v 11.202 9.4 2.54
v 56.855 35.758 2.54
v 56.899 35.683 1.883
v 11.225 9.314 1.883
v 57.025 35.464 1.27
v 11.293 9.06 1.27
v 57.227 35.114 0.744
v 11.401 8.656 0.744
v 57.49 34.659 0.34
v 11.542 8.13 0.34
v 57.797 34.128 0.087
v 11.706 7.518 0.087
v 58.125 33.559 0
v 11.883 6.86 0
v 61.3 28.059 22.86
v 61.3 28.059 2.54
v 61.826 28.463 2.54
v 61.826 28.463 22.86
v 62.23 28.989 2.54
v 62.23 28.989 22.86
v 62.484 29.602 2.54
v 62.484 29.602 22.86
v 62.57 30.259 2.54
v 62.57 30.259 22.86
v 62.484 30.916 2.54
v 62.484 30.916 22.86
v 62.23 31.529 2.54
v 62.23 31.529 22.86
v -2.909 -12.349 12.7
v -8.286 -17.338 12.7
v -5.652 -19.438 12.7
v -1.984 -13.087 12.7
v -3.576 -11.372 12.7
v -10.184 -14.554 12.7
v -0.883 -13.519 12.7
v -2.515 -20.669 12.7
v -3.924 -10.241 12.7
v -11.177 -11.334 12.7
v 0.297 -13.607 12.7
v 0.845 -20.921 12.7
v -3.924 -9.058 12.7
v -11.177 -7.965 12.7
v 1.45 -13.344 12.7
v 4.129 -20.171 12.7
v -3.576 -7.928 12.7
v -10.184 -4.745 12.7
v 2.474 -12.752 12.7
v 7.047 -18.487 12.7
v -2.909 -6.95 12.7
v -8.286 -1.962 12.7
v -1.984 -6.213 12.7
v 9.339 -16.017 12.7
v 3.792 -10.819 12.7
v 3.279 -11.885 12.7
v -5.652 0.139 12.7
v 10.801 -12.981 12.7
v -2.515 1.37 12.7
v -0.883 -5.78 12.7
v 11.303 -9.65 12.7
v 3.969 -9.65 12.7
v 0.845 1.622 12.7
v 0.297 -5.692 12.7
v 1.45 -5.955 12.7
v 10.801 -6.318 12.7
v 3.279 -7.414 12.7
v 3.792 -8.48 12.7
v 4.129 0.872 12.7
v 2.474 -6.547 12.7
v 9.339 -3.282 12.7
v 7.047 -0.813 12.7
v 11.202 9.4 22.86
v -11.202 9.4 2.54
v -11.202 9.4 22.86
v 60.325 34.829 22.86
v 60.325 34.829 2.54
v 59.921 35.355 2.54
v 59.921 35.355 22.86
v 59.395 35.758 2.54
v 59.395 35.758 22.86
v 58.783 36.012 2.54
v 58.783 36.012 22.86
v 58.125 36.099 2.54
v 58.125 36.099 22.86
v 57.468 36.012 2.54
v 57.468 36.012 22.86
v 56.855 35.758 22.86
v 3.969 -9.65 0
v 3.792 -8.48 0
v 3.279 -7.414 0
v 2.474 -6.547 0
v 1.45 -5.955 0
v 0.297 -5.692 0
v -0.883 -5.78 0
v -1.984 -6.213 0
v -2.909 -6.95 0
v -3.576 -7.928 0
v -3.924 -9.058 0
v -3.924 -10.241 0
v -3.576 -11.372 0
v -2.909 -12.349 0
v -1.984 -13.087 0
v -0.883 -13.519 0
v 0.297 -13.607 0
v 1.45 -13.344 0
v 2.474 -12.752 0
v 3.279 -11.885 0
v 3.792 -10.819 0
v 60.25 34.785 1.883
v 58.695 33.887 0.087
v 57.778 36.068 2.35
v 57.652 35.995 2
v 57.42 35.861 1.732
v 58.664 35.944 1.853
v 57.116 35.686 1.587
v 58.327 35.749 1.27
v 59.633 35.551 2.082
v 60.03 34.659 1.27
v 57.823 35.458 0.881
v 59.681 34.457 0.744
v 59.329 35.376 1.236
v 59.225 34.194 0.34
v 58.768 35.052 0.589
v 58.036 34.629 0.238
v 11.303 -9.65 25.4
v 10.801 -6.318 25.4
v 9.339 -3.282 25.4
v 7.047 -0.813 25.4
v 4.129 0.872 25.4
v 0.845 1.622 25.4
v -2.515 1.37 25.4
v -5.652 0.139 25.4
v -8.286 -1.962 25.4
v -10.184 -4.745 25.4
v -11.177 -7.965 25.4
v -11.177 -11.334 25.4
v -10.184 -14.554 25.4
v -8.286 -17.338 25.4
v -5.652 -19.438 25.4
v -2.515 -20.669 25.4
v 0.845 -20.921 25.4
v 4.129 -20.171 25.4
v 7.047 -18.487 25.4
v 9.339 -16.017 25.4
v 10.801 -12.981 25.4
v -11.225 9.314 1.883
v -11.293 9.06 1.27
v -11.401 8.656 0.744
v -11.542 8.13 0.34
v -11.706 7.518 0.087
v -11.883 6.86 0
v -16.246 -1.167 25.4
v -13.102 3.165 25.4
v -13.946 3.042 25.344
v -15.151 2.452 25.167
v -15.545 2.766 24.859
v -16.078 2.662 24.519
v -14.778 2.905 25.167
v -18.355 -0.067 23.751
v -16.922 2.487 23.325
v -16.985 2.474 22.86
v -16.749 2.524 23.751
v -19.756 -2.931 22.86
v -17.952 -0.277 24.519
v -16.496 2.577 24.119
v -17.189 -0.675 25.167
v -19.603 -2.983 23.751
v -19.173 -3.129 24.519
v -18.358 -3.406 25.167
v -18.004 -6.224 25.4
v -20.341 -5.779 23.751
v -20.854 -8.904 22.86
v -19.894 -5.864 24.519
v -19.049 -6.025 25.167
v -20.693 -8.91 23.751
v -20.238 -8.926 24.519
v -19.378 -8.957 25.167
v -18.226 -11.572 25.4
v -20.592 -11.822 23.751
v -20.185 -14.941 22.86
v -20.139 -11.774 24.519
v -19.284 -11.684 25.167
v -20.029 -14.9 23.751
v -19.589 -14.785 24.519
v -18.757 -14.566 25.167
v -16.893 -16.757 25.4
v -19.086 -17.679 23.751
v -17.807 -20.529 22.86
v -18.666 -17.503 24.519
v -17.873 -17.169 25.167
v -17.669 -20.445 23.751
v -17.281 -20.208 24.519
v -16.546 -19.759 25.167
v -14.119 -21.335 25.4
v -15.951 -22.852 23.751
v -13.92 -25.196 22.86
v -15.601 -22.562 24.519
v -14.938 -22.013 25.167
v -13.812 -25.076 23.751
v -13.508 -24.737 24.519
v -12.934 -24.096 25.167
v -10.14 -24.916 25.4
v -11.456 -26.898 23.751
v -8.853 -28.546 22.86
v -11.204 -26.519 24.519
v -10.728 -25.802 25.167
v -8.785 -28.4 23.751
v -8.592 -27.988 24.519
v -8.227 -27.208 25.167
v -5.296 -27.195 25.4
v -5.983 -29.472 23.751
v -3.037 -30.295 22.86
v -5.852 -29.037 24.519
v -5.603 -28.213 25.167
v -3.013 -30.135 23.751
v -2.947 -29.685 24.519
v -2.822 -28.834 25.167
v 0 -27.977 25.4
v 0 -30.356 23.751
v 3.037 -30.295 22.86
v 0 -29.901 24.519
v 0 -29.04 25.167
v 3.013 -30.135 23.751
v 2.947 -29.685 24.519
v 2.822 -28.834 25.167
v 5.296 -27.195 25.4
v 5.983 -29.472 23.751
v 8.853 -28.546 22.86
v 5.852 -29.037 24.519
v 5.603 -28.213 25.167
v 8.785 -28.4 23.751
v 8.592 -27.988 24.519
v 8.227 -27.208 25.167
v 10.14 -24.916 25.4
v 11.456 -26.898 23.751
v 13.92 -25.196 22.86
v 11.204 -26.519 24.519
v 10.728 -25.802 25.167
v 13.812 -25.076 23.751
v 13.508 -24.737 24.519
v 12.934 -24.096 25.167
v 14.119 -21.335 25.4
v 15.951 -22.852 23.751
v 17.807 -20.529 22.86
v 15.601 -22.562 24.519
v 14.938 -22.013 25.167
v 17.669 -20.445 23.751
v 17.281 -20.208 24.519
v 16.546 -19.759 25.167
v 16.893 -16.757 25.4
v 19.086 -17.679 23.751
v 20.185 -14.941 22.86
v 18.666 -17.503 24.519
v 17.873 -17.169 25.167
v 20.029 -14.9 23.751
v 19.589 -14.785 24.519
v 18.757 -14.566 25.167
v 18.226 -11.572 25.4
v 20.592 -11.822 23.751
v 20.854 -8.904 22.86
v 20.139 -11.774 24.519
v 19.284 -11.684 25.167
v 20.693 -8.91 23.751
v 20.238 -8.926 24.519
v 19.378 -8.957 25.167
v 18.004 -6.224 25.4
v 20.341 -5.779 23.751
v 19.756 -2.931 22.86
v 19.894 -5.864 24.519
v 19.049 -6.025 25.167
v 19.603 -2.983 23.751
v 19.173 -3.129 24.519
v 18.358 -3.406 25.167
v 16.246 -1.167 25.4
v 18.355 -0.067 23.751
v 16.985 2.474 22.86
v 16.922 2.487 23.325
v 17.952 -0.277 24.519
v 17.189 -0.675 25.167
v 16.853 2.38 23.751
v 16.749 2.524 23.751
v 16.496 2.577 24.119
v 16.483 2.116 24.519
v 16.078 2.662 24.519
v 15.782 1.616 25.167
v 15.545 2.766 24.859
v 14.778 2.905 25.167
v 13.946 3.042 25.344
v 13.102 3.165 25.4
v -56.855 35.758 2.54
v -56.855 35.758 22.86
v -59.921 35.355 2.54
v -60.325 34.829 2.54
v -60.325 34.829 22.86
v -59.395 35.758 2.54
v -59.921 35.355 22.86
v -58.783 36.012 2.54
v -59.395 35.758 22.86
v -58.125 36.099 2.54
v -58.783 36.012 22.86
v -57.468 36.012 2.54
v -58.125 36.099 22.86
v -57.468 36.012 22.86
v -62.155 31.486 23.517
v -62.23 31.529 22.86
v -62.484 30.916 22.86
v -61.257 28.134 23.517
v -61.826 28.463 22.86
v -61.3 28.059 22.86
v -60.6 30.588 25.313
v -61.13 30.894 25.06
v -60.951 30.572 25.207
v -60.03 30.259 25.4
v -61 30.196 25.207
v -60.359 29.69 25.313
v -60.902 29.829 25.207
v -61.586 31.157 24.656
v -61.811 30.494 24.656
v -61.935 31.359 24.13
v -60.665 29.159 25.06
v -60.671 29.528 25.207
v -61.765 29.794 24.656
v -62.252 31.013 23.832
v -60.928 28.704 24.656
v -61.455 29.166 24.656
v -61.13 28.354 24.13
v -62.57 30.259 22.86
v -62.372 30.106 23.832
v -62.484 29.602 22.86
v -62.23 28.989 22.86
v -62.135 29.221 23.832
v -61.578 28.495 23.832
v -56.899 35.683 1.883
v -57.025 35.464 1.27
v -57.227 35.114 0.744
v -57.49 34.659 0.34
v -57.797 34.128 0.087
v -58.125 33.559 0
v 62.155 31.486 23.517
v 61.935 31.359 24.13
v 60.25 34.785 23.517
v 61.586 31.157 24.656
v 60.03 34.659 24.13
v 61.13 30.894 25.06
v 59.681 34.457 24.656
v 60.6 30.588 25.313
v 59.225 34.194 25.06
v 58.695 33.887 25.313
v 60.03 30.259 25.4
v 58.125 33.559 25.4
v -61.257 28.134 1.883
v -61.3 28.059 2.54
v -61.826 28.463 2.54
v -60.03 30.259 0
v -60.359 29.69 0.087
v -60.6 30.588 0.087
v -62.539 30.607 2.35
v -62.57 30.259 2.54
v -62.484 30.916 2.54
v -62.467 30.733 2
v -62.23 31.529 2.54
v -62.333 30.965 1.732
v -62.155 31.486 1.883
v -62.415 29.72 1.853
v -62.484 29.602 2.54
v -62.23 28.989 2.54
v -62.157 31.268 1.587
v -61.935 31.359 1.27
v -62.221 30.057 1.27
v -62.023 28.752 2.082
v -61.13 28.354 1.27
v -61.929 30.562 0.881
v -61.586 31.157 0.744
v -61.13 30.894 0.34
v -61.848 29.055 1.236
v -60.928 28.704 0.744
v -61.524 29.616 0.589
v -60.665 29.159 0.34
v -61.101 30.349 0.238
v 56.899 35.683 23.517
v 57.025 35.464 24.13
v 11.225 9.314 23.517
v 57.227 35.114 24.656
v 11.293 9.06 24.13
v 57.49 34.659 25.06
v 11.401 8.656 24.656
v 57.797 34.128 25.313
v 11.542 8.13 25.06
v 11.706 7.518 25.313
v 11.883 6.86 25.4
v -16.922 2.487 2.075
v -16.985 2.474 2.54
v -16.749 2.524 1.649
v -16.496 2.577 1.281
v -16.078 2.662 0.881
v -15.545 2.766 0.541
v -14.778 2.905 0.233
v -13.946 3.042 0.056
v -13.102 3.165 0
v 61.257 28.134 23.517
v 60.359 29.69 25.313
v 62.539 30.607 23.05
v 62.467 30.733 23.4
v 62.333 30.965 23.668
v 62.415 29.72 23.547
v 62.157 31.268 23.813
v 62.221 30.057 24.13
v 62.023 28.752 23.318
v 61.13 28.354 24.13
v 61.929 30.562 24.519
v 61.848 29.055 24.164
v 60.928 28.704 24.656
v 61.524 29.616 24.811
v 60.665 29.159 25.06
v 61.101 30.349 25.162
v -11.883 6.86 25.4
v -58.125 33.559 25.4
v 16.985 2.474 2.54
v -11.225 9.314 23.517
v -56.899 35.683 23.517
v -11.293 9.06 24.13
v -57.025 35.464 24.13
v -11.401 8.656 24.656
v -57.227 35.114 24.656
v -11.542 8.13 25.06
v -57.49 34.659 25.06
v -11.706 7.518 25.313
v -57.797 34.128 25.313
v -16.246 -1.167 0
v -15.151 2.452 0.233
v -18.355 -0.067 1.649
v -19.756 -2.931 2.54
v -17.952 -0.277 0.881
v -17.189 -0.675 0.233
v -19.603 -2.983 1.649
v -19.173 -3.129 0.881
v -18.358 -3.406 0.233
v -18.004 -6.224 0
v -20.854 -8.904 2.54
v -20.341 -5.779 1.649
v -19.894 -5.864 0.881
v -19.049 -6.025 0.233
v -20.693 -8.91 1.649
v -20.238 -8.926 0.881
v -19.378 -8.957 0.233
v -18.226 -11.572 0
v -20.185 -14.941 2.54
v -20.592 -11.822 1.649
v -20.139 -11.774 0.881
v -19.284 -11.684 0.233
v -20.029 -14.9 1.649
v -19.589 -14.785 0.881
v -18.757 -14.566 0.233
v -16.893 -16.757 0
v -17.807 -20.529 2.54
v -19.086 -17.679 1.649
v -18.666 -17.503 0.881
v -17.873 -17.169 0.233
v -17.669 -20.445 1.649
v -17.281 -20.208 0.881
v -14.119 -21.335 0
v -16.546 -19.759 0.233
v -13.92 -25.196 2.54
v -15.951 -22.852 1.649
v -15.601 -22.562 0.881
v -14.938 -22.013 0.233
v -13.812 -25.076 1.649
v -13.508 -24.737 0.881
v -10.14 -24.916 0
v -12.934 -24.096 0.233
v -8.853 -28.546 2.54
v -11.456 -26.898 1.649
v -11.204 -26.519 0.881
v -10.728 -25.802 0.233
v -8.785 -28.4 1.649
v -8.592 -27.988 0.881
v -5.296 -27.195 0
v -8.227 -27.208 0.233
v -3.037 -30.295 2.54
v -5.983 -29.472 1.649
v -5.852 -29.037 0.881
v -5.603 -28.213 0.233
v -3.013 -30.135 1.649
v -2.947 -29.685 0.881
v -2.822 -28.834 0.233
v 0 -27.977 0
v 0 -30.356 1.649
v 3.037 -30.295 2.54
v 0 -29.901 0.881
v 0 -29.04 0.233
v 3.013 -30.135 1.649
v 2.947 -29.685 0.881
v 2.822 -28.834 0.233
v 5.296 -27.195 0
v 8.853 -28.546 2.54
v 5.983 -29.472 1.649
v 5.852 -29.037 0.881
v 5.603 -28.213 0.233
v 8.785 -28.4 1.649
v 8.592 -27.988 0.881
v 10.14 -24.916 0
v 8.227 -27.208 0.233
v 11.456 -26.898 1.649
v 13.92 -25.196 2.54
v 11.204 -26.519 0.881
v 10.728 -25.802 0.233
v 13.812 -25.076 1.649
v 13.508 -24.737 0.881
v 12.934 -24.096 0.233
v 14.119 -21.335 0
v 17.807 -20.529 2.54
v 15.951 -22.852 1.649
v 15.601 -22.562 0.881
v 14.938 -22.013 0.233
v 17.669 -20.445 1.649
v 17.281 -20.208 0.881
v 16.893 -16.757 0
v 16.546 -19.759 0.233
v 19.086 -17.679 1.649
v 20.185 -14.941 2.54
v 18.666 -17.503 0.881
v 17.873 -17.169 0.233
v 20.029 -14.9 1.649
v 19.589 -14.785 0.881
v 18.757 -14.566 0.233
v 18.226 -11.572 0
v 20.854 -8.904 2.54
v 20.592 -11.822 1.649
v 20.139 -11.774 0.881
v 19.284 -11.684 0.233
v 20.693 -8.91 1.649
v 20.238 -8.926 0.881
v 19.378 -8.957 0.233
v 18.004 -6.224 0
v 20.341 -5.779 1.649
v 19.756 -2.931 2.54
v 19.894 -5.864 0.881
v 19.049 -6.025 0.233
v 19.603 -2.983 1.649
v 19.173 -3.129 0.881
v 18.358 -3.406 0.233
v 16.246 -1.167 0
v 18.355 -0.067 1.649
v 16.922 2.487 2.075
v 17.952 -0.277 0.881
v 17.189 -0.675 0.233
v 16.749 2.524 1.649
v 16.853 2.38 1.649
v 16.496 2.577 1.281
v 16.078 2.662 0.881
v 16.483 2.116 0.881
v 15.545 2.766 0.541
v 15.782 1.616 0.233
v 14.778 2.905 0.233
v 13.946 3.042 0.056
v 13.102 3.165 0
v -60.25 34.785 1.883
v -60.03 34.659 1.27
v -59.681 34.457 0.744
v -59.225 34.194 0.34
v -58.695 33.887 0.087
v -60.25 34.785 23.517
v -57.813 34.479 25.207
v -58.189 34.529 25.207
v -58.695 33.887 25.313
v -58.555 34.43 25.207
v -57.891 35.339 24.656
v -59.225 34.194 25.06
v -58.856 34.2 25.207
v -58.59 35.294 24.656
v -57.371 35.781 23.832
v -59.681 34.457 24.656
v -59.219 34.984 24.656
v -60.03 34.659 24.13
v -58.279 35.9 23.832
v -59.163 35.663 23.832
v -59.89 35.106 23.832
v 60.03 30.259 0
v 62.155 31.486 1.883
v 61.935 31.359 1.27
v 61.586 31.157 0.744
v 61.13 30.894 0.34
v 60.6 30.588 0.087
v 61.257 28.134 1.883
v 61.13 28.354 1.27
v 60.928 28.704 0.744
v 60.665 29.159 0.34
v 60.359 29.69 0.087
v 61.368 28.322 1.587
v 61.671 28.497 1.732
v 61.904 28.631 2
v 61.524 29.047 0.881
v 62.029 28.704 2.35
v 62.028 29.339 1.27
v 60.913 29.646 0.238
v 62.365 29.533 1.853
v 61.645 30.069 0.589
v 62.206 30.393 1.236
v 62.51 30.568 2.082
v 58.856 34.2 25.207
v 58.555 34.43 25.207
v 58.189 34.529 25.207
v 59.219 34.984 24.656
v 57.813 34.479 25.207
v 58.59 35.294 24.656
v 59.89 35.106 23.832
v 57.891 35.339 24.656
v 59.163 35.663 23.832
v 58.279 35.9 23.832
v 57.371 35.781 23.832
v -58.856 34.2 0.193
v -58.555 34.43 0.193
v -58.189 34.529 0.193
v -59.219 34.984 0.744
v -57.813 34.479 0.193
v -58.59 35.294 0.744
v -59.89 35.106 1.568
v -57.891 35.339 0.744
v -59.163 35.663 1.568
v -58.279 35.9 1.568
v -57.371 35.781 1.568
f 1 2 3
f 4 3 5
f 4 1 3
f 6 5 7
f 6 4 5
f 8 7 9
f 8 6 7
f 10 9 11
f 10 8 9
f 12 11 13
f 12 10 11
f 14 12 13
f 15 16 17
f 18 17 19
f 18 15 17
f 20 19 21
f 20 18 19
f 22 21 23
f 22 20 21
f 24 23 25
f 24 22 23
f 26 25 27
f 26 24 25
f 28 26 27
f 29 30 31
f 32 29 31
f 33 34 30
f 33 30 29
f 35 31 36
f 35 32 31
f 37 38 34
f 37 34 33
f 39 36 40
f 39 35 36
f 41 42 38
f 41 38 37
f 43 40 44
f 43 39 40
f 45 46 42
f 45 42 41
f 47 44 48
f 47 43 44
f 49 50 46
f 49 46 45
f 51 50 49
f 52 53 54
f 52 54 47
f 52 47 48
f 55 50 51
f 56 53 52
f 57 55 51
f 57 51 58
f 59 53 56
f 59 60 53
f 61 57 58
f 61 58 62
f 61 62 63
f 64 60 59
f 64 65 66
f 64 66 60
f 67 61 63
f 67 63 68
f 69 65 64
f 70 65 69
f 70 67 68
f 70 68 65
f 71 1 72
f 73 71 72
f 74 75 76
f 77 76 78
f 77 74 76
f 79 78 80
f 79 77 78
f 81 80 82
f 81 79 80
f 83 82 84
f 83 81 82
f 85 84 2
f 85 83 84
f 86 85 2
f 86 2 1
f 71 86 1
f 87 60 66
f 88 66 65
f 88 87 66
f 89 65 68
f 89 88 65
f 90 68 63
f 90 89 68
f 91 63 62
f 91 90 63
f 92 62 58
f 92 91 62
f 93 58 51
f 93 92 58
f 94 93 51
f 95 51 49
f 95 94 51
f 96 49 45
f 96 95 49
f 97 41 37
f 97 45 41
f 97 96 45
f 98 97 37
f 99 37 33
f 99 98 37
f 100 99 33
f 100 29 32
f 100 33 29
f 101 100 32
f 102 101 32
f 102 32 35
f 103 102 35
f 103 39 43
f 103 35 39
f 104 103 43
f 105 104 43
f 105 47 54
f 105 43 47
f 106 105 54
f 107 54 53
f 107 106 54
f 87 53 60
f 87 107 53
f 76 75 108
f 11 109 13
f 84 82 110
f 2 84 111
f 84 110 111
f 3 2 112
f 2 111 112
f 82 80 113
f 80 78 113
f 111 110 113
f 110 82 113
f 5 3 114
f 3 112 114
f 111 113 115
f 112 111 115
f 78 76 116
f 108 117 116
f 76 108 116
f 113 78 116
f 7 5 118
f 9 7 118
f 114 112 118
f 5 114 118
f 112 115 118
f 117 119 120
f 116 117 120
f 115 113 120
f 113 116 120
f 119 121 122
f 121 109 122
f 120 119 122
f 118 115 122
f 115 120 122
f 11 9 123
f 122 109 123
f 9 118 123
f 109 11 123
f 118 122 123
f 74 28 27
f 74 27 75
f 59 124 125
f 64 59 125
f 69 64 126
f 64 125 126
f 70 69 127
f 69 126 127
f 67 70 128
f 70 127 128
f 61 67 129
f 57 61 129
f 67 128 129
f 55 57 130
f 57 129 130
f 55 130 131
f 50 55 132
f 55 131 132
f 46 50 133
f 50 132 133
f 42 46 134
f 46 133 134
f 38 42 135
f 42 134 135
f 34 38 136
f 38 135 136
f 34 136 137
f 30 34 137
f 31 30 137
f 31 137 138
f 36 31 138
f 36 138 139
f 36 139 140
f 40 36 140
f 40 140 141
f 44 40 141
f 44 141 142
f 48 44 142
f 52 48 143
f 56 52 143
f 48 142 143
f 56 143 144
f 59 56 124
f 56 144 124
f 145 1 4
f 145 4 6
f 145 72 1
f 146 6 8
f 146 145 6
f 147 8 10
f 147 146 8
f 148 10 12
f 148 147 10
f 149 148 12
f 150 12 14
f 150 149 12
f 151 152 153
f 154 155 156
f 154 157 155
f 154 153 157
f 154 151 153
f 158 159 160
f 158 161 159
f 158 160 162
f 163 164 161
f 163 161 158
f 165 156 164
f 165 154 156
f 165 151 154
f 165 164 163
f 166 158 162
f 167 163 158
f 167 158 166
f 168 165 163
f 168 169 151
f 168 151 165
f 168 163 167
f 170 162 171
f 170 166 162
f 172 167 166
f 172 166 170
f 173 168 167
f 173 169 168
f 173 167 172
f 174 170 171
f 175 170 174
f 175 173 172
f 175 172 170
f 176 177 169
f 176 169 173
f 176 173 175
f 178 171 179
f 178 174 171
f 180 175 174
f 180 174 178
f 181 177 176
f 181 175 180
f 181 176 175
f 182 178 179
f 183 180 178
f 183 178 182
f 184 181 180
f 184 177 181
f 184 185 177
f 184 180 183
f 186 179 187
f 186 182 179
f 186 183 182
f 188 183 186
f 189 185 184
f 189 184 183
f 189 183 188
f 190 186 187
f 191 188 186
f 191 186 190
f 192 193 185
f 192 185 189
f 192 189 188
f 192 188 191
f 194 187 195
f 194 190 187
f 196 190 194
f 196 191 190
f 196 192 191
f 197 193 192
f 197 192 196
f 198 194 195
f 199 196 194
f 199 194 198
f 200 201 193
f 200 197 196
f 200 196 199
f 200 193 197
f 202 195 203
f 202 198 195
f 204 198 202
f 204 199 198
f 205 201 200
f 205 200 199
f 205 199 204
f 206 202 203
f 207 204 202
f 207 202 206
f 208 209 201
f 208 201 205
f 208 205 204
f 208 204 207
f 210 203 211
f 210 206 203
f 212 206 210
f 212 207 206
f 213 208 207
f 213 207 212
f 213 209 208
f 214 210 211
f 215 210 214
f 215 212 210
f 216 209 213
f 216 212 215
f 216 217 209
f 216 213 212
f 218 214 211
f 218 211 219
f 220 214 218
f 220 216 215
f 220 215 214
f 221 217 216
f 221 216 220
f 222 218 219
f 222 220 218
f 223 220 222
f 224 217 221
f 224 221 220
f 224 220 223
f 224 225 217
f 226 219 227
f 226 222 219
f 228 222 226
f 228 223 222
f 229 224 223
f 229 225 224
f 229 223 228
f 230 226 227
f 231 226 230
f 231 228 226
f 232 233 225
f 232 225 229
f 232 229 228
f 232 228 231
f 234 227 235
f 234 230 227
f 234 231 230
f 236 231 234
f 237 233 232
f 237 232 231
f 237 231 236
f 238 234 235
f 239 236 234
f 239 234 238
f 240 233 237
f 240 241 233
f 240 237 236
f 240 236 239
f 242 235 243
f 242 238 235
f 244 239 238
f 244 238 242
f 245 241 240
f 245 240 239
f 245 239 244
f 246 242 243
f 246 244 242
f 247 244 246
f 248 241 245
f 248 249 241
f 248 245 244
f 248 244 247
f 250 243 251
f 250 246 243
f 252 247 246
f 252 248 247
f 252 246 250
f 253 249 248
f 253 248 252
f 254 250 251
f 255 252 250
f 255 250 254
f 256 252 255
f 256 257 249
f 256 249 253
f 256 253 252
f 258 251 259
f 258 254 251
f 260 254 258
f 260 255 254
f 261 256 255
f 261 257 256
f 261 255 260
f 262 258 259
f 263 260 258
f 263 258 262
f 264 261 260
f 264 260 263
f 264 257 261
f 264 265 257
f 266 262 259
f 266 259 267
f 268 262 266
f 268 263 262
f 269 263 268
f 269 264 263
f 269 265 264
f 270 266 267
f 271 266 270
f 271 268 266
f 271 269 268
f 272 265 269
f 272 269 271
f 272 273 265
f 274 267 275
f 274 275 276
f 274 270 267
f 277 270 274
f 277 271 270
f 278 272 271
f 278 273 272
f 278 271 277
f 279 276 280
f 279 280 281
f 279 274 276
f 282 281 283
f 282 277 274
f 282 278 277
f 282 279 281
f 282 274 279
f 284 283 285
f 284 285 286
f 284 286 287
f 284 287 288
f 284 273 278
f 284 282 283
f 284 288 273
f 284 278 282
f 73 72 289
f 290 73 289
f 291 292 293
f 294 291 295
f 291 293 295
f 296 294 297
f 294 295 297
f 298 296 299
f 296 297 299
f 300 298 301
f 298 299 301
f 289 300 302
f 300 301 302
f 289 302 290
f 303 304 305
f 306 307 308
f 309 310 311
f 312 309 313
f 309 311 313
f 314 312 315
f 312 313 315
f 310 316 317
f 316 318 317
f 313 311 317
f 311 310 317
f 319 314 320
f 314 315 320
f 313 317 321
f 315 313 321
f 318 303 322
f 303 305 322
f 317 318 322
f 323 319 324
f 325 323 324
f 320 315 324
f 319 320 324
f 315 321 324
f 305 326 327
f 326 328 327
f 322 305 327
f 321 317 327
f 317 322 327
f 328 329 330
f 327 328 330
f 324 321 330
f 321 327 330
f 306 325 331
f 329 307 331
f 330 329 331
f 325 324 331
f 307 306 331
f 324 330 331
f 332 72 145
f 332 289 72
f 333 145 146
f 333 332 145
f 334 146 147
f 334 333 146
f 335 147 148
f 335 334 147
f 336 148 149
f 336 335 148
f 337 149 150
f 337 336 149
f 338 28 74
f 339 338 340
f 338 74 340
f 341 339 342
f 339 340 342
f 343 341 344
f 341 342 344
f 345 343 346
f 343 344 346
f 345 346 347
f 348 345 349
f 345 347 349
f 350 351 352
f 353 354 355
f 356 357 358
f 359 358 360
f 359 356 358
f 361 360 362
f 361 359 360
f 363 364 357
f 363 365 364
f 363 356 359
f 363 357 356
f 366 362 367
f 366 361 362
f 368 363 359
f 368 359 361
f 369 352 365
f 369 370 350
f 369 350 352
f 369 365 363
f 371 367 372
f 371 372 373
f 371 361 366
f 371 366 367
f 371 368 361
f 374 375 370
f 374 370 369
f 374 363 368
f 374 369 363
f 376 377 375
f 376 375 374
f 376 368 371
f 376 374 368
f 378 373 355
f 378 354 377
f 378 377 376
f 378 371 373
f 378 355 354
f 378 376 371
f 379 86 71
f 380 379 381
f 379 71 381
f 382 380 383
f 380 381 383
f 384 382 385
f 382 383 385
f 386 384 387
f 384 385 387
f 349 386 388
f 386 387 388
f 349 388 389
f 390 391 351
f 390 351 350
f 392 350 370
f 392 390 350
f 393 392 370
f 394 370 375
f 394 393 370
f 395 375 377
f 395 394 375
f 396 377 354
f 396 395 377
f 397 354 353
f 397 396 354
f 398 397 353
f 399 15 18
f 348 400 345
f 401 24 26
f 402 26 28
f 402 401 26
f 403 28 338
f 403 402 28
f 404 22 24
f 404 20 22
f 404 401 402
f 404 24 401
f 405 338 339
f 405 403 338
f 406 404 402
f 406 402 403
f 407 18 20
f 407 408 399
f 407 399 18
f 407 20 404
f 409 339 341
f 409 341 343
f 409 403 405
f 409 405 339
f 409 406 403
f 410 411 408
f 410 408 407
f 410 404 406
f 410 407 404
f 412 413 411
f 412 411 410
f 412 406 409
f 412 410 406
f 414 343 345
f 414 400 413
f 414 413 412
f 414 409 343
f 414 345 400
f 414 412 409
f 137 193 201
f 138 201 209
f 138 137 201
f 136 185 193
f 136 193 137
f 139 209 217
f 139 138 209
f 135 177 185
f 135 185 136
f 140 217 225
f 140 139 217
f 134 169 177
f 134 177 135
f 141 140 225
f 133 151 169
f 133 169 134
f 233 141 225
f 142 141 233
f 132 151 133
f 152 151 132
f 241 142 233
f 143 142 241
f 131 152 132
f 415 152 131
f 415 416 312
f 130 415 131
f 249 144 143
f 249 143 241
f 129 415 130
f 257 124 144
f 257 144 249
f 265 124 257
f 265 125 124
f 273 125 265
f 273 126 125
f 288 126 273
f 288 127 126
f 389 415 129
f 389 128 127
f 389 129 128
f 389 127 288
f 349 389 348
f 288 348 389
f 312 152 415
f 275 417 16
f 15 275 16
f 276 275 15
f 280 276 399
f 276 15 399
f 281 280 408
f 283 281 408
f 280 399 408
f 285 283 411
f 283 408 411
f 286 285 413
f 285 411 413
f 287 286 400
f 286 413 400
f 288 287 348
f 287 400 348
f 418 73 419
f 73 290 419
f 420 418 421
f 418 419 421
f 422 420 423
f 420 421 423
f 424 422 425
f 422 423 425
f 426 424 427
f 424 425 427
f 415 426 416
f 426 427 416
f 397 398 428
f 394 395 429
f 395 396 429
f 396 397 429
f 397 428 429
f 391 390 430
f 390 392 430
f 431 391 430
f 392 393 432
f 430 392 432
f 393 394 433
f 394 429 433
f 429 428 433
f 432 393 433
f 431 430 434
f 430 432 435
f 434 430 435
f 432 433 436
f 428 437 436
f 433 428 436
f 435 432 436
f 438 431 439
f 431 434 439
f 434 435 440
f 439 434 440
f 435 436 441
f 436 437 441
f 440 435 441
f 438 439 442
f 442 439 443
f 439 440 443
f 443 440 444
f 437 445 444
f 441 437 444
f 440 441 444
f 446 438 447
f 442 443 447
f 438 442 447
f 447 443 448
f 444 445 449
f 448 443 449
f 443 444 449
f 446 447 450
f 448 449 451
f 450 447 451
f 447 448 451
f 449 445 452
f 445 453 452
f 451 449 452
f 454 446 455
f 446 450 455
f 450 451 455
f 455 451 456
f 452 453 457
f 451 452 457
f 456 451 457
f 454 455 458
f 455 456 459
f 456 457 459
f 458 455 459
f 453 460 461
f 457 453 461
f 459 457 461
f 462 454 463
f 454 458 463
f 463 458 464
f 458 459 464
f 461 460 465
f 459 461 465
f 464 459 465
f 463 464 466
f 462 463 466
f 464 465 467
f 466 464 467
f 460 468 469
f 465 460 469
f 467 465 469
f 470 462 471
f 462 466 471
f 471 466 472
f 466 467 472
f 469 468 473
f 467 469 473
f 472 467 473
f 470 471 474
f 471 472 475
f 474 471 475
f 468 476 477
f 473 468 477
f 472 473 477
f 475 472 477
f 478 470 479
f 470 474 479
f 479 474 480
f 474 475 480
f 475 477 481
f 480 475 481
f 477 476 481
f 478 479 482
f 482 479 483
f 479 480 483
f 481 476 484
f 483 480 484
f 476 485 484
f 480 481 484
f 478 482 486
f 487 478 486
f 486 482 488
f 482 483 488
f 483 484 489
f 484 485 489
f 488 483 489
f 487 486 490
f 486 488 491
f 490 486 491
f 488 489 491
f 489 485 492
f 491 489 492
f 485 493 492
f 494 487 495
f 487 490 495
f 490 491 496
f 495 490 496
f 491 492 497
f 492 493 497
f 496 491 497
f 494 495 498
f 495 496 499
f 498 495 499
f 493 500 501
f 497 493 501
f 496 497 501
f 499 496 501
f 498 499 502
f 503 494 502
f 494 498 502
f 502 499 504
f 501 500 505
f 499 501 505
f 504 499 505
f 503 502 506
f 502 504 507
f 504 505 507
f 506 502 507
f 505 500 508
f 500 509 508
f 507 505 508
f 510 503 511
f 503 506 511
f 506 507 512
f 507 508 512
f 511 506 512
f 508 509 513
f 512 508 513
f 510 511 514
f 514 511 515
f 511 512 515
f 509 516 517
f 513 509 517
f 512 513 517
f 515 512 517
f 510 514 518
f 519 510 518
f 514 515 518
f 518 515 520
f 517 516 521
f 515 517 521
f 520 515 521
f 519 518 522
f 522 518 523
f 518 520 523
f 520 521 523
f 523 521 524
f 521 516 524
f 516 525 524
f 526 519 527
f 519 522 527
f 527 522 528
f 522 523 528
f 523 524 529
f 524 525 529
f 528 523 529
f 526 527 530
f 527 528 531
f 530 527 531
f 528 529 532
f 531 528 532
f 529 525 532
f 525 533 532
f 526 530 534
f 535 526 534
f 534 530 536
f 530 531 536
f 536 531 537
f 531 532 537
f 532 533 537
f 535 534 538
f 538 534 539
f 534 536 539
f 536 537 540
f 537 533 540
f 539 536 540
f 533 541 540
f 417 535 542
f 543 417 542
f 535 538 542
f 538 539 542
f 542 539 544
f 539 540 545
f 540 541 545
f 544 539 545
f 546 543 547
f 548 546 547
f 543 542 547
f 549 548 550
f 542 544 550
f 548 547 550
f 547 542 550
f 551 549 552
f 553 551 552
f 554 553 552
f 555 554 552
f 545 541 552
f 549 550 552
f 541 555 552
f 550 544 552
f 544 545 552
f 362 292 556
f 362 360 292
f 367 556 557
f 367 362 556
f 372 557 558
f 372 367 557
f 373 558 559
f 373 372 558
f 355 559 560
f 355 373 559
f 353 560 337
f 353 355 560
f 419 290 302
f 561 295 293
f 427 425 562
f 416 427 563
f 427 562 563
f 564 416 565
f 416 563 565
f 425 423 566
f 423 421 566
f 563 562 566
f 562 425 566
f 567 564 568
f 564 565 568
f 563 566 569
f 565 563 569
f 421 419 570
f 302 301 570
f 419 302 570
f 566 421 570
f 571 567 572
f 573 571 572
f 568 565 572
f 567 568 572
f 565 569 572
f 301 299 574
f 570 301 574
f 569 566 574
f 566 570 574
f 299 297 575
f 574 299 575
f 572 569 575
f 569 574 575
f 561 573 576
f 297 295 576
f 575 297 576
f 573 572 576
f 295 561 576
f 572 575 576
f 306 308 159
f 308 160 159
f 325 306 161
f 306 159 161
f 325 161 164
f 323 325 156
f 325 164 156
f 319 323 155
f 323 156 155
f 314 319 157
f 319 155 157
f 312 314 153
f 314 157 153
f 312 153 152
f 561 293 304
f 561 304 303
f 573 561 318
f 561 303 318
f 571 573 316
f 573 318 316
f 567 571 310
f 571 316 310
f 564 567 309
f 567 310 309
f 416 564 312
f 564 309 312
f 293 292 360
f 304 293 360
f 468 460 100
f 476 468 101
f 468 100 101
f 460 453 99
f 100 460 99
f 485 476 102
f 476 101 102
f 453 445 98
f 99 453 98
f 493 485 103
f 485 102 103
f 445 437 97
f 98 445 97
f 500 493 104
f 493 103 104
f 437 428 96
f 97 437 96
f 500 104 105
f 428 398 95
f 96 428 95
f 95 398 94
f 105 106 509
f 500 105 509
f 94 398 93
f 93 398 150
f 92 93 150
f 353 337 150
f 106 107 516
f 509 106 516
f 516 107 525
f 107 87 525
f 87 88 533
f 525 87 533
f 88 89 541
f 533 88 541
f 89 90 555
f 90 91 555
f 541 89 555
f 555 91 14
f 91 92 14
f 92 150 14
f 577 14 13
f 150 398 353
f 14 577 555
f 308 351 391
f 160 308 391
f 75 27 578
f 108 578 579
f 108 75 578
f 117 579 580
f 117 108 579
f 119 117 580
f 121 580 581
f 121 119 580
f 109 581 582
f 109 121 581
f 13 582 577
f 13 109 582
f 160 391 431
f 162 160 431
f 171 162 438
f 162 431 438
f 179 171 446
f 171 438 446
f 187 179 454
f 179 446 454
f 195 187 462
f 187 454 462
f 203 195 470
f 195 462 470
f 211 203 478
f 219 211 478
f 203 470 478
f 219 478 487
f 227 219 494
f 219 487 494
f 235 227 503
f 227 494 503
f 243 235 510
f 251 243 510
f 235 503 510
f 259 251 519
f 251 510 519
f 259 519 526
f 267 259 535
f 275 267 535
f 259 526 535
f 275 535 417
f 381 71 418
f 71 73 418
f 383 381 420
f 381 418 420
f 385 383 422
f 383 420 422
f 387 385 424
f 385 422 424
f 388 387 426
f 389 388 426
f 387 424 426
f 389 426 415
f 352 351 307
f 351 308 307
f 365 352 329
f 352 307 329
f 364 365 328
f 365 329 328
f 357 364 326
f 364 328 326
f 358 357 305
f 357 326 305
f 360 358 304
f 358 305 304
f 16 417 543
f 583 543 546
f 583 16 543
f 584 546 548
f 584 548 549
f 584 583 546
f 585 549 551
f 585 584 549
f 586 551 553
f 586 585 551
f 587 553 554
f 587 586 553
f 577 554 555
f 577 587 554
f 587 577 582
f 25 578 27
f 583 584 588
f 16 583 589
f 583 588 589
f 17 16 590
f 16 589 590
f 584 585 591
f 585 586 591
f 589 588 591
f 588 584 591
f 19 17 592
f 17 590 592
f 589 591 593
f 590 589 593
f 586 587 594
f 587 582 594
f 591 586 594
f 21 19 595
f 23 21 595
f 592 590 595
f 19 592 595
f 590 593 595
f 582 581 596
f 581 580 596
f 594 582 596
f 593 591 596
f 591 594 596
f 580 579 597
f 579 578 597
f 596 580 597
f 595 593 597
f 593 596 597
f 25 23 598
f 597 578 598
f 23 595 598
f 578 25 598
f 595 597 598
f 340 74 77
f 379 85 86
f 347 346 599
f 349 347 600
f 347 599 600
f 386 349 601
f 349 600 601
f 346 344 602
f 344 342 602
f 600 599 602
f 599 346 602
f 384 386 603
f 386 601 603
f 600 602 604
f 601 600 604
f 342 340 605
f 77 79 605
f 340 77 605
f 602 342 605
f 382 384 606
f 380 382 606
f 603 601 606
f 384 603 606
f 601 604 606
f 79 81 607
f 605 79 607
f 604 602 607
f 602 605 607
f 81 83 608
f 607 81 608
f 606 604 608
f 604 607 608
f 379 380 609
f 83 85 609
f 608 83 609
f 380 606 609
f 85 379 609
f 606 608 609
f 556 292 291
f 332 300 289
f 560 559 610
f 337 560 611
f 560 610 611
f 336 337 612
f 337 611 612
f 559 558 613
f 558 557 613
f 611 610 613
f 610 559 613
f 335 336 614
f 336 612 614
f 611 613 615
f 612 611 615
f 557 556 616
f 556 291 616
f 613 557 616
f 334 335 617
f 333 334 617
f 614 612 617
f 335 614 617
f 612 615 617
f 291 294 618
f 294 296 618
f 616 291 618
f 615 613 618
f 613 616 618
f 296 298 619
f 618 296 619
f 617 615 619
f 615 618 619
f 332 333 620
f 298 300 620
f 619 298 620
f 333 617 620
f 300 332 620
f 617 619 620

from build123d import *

# Parameters (mm, degrees)
SKETCH2_R           = 3.96875
BOSS_EXTRUDE1_DEPTH = 25.4
FILLET3_R           = 2.54
SKETCH3_R           = 11.303
CUT_EXTRUDE1_DEPTH  = 12.7


with BuildPart() as part:
    # Sketch2 → Boss-Extrude1 (new body)
    with BuildSketch(Plane.XY):
        with BuildLine():
            Line((16.984572795, 2.473699256), (63.5, 29.329393675))
            Line((63.5, 29.329393675), (59.055, 37.028359514))
            Line((59.055, 37.028359514), (11.202045256, 9.400443212))
            Line((11.202045256, 9.400443212), (-11.202045256, 9.400443212))
            Line((-11.202045256, 9.400443212), (-59.055, 37.028359514))
            Line((-59.055, 37.028359514), (-63.5, 29.329393675))
            Line((-63.5, 29.329393675), (-16.984572795, 2.473699256))
            ThreePointArc((-16.984572795, 2.473699256), (0, -30.51697278), (16.984572795, 2.473699256))
        make_face()
        with Locations((0, -9.649556788)):
            Circle(SKETCH2_R, mode=Mode.SUBTRACT)
    extrude(amount=BOSS_EXTRUDE1_DEPTH)

    # Fillet3
    fillet3_edges = [part.edges().sort_by_distance(p)[0] for p in [
        (61.2775, 33.178876595, 0),
        (40.242286397, 15.901546466, 0),
        (0, -30.51697278, 0),
        (-40.242286397, 15.901546466, 0),
        (40.242286397, 15.901546466, 25.4),
        (-63.5, 29.329393675, 12.7),
        (-59.055, 37.028359514, 12.7),
        (59.055, 37.028359514, 12.7),
        (63.5, 29.329393675, 12.7),
        (61.2775, 33.178876595, 25.4),
        (35.128522628, 23.214401363, 25.4),
        (0, 9.400443212, 25.4),
        (-35.128522628, 23.214401363, 25.4),
        (-61.2775, 33.178876595, 25.4),
        (-40.242286397, 15.901546466, 25.4),
        (-61.2775, 33.178876595, 0),
        (0, -30.51697278, 25.4),
        (-35.128522628, 23.214401363, 0),
        (0, 9.400443212, 0),
        (35.128522628, 23.214401363, 0),
    ]]
    fillet(fillet3_edges, radius=FILLET3_R)

    # Sketch3 → Cut-Extrude1 (cut)
    with BuildSketch(Plane.XY.offset(25.4)):
        with Locations((0, -9.649556788)):
            Circle(SKETCH3_R)
    extrude(amount=-CUT_EXTRUDE1_DEPTH, mode=Mode.SUBTRACT)


solid = part.part
